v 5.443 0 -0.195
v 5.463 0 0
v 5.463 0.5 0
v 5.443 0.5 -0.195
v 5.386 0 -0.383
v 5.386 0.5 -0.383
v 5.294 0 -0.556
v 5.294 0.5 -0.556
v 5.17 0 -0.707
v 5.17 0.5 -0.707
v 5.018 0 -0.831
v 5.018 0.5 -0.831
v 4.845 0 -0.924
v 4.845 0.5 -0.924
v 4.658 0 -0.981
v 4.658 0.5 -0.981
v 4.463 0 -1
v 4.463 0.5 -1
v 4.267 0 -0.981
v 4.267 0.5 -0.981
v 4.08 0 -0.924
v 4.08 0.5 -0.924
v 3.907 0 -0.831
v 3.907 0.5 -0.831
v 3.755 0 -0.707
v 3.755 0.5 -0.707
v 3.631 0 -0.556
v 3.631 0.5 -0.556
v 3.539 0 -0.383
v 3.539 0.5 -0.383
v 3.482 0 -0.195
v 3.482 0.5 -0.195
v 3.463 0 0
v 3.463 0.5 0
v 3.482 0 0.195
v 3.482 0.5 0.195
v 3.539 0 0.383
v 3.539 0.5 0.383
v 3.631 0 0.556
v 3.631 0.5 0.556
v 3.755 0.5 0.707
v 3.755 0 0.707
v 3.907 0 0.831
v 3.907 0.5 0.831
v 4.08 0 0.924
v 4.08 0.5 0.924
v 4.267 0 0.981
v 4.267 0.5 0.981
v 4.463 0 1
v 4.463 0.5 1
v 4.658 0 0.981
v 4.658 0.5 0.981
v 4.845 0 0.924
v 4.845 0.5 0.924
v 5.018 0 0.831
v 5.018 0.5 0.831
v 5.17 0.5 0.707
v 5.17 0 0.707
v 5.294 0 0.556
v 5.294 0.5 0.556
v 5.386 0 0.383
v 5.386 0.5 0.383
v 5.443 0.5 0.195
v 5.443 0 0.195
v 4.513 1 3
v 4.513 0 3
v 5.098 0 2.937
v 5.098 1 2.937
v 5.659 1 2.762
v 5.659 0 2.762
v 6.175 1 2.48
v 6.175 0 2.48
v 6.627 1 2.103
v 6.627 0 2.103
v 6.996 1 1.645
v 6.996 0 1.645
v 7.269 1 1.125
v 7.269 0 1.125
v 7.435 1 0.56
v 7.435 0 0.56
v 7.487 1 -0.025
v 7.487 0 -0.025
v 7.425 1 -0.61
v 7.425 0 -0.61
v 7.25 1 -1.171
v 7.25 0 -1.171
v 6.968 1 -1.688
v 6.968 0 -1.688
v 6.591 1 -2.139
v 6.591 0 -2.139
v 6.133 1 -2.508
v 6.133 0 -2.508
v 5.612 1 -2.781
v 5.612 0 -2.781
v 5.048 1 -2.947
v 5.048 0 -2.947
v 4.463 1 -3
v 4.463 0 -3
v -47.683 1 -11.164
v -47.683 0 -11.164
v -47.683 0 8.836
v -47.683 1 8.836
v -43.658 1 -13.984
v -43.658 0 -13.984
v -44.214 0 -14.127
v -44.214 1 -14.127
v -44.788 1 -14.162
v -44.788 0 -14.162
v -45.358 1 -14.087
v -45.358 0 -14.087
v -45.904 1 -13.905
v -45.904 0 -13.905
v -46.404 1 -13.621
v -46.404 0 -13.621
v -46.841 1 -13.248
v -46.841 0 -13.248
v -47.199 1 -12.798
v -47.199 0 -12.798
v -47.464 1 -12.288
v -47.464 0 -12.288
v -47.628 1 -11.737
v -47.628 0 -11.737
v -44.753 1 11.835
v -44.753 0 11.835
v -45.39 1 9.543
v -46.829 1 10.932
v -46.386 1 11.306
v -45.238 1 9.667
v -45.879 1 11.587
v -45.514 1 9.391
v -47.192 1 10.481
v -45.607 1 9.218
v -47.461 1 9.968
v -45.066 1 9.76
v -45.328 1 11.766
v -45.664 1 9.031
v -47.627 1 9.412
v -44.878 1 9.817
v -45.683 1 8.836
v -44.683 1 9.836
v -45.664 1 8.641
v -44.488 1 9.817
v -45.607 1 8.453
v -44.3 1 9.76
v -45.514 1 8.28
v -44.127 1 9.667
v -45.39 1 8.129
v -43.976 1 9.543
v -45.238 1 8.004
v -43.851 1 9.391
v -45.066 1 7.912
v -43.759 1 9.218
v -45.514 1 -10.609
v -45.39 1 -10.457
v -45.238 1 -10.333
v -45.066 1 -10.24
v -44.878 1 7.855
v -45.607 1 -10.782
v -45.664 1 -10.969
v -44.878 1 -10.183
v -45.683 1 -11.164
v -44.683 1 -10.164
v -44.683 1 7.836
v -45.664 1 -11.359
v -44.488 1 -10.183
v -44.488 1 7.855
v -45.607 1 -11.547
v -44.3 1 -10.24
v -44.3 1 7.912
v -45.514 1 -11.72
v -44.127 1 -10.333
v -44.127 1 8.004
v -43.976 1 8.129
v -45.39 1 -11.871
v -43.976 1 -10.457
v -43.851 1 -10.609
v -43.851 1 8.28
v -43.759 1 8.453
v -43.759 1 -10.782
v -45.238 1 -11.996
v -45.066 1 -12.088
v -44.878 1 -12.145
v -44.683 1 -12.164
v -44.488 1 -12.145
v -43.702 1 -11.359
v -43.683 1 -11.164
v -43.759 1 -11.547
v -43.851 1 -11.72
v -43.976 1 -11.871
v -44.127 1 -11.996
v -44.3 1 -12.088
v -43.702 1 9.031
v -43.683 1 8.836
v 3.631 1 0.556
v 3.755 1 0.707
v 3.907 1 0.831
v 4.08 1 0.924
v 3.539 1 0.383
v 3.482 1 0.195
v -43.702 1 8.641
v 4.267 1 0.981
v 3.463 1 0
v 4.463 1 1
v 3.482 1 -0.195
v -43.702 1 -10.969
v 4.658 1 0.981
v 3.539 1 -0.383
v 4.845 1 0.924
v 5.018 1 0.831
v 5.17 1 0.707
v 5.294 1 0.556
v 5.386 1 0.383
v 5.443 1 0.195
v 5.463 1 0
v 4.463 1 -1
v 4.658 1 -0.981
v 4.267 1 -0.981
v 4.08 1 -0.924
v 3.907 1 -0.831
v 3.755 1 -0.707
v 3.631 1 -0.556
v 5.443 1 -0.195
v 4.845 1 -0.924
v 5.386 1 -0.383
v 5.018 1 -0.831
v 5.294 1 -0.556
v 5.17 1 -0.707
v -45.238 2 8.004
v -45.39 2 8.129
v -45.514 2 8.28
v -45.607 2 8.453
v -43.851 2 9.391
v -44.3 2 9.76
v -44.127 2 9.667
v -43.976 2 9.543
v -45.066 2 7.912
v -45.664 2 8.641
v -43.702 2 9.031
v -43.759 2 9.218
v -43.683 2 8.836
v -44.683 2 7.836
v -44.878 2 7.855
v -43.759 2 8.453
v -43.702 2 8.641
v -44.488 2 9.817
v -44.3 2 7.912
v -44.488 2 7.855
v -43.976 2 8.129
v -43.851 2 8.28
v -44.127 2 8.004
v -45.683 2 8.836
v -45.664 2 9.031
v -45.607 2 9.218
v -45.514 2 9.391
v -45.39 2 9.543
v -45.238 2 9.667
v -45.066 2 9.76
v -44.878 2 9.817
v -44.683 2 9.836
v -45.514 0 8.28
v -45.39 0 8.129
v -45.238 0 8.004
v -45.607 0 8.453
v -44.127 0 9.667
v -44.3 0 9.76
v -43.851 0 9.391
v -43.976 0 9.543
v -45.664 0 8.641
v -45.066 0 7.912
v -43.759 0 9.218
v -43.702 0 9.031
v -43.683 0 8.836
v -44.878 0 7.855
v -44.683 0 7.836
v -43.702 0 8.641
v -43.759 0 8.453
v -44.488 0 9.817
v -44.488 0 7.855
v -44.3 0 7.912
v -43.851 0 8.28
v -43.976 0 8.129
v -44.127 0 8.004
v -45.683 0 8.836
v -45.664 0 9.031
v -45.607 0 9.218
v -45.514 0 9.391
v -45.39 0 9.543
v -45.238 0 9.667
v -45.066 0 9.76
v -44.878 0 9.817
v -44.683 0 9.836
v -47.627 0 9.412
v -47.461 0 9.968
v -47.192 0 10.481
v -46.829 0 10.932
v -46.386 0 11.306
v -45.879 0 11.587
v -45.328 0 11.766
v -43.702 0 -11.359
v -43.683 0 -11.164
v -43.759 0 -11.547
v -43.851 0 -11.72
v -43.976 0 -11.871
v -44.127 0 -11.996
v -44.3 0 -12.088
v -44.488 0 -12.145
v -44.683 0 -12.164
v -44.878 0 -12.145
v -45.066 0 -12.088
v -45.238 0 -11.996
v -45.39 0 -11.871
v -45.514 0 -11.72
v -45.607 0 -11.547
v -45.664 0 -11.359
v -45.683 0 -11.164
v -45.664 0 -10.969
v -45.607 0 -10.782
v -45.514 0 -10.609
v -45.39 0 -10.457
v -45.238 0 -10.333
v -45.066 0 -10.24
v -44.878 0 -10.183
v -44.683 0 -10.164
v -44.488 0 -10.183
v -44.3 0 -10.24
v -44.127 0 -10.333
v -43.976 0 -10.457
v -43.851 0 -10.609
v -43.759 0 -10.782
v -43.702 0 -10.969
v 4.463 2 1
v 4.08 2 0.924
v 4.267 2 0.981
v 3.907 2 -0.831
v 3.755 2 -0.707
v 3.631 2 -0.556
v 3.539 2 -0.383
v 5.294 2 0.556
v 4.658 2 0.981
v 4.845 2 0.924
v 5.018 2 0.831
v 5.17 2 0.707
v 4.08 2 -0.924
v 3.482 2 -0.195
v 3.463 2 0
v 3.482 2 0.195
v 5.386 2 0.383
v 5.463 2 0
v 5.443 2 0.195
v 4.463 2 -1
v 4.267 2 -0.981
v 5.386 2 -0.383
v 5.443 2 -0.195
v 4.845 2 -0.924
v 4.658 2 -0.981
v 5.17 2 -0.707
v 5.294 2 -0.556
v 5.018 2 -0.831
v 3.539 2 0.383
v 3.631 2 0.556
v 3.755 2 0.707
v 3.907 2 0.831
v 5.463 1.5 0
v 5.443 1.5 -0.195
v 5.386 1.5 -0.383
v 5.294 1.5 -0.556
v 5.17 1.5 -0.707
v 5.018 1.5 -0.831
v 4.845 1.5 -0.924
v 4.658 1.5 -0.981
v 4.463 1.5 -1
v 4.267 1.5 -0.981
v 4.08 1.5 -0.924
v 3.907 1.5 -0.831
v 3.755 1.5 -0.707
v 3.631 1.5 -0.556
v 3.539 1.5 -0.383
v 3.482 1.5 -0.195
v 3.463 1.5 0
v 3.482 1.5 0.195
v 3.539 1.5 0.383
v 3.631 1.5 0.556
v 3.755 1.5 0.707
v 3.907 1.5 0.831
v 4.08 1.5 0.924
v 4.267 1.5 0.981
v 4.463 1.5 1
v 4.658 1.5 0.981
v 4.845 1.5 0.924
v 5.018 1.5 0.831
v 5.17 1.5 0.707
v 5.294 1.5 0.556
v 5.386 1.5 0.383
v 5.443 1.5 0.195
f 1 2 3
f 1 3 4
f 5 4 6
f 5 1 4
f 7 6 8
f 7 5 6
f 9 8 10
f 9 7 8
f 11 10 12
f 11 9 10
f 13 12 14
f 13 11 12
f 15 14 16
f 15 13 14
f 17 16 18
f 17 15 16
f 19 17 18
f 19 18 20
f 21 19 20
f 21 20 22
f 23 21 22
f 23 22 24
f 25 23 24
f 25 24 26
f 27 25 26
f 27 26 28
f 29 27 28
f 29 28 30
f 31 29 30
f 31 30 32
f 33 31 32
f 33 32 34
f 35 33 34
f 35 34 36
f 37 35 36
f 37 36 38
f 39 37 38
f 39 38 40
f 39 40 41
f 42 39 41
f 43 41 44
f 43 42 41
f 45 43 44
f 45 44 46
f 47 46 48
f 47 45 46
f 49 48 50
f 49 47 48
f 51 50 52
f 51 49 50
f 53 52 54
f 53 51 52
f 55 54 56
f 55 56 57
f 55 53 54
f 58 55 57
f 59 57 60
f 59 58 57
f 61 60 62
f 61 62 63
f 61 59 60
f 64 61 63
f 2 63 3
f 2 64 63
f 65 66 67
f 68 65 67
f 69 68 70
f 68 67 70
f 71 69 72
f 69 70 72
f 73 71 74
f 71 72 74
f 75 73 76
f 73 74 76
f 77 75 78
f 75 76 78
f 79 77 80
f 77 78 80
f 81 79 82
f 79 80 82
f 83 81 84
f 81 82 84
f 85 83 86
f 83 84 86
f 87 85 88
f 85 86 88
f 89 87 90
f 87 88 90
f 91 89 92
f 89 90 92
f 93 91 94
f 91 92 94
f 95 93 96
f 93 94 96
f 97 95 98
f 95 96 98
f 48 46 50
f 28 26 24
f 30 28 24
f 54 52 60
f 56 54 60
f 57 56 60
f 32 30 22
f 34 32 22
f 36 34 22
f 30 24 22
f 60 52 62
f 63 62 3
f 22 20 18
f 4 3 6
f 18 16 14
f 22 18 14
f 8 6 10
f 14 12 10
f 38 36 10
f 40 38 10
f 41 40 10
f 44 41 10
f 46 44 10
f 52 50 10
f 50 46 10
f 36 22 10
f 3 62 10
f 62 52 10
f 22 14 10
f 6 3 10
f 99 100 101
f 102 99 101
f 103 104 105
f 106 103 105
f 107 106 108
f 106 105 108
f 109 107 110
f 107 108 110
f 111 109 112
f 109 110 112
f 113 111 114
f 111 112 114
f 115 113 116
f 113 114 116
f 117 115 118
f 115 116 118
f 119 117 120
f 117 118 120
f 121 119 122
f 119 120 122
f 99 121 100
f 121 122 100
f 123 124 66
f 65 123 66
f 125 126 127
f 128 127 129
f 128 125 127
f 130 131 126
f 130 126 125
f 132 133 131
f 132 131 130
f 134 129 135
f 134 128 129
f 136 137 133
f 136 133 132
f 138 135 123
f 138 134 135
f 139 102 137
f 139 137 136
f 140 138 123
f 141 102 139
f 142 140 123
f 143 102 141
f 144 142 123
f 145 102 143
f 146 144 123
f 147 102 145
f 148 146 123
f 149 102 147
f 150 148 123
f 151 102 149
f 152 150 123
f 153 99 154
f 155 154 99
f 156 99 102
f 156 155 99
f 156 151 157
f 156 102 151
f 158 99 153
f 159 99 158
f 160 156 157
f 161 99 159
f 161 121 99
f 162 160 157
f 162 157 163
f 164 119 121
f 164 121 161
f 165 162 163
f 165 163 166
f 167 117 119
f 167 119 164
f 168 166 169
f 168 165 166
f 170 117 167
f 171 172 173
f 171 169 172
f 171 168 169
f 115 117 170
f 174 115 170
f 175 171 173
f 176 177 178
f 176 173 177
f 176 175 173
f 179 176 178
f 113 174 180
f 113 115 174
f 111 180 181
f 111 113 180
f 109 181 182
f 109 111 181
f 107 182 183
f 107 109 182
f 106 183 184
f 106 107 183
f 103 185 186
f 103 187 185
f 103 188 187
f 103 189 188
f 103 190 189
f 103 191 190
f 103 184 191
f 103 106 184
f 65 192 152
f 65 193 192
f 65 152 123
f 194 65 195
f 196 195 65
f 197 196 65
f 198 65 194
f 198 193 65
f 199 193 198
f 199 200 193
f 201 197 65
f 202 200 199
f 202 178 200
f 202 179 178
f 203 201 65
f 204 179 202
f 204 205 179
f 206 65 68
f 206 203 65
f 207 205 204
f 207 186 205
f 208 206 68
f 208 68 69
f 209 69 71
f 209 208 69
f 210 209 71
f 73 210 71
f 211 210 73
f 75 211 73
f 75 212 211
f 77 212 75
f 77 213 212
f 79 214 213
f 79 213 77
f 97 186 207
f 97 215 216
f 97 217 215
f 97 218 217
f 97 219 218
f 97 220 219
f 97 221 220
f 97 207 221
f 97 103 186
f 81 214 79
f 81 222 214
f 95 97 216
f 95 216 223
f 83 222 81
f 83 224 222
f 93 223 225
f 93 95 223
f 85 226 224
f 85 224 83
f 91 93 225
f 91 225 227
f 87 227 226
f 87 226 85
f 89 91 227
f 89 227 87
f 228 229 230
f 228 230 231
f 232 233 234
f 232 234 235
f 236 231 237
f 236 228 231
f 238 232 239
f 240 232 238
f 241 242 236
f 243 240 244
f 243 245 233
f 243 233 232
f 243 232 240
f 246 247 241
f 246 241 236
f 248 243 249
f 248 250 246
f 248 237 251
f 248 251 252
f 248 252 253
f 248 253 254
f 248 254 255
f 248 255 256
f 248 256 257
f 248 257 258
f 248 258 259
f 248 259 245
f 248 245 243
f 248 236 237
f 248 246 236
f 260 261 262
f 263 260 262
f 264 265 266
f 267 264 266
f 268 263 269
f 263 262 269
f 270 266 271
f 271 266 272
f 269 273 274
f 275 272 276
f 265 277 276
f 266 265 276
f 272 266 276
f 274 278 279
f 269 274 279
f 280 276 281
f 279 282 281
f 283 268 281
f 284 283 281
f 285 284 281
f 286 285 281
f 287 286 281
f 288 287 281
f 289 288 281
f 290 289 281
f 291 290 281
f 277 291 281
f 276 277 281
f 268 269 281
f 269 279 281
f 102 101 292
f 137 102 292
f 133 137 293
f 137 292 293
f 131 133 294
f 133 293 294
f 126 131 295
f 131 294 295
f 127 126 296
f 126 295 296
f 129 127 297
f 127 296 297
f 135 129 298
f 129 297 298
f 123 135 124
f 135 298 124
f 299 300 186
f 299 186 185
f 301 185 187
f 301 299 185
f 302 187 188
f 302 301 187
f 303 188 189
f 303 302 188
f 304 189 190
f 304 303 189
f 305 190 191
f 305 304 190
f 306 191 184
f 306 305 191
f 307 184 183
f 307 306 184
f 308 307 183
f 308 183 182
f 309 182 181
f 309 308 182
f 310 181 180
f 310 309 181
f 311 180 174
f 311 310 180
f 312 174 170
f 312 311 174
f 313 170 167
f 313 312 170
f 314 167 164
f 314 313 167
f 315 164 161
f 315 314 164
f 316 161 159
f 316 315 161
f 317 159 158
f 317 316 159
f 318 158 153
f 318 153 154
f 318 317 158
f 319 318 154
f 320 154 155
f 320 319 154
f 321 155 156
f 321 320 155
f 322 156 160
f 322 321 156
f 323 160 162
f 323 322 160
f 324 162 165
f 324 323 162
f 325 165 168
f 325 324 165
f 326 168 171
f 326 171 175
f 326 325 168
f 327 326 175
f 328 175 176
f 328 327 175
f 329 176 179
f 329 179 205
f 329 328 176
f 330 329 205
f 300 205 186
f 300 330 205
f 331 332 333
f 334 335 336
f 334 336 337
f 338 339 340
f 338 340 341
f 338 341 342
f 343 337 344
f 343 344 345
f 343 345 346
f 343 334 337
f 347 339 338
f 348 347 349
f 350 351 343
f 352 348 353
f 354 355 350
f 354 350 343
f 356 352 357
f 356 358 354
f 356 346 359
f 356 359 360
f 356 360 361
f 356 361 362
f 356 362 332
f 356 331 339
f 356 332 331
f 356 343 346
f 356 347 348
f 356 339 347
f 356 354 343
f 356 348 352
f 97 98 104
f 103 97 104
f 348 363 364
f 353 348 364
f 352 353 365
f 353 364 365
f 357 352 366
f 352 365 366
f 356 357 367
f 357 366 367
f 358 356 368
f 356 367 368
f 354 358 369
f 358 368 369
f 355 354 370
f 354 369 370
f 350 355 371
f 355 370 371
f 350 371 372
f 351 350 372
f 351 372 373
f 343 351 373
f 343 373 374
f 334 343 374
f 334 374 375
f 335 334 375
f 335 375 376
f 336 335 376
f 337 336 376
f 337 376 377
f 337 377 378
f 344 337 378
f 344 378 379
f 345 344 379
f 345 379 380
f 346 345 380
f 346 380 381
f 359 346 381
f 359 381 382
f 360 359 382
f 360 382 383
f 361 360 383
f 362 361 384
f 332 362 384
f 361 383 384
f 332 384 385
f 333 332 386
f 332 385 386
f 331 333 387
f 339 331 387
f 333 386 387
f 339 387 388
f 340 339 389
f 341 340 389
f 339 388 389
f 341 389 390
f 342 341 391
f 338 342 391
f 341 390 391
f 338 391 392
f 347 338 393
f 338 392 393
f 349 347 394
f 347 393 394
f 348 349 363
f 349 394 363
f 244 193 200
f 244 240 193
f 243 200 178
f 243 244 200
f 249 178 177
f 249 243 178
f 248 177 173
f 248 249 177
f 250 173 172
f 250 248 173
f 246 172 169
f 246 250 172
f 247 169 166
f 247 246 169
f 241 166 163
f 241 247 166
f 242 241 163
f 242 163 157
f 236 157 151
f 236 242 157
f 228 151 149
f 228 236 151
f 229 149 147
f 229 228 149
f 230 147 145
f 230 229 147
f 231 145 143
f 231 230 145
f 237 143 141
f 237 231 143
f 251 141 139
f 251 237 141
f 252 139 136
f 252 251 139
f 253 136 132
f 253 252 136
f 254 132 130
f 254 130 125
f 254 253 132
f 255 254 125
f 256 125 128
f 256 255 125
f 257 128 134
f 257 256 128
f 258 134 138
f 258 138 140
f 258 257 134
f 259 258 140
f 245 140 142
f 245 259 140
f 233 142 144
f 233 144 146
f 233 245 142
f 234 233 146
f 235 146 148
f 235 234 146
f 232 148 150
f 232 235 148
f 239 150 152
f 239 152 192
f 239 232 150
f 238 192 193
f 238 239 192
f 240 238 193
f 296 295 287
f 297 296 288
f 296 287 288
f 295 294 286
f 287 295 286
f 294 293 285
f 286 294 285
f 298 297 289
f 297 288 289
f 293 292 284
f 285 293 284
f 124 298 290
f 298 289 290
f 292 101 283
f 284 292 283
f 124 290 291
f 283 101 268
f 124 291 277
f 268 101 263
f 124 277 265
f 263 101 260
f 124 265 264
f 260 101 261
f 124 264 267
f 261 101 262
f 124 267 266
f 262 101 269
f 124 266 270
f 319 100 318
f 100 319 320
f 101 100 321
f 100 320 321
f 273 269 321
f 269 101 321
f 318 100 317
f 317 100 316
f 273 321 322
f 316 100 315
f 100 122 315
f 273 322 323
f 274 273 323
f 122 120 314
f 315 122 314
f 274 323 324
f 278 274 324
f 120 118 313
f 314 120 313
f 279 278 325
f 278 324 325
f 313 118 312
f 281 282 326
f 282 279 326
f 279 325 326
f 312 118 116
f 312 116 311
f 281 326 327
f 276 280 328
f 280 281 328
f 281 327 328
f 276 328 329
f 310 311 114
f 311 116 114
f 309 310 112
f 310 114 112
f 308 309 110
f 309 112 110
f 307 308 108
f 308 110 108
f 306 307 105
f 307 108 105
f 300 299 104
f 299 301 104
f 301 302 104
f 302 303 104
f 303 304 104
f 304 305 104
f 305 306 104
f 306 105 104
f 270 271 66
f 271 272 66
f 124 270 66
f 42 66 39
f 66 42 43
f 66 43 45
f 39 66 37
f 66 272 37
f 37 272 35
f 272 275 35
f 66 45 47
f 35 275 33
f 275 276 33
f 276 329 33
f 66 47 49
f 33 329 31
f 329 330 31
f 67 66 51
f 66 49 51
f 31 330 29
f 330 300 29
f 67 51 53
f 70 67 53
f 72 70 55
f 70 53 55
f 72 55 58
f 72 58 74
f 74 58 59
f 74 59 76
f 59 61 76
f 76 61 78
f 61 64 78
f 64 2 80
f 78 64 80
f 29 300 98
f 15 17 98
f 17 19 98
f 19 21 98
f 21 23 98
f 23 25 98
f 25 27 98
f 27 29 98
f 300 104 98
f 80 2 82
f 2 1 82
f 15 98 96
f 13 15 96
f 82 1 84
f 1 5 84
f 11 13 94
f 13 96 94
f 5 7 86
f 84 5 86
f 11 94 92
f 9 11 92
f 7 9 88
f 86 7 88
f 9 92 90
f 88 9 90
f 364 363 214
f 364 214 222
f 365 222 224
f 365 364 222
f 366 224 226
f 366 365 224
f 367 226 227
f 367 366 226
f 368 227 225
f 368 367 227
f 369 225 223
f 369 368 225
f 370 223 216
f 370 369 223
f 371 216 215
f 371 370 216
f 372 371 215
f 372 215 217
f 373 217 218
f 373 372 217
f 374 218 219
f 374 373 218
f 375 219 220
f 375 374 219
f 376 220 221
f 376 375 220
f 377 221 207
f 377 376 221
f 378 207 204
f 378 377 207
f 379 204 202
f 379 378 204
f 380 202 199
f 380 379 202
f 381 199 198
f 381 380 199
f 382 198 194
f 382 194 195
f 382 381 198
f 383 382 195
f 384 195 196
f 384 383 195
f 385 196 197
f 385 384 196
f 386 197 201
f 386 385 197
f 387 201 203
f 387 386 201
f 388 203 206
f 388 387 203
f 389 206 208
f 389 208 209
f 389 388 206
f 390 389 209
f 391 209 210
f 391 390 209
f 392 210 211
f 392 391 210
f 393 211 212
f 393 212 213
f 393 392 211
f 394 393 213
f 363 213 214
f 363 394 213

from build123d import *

# Parameters (mm, degrees)
SKETCH1_R           = 1
BOSS_EXTRUDE5_DEPTH = 1
SKETCH3_R           = 1
BOSS_EXTRUDE6_DEPTH = 0.5
SKETCH5_R           = 1
BOSS_EXTRUDE8_DEPTH = 1
SKETCH6_R           = 1
BOSS_EXTRUDE9_DEPTH = 1


with BuildPart() as part:
    # Sketch1 → Boss-Extrude5 (new body)
    with BuildSketch(Plane(origin=(0, 0, 0), x_dir=(1, 0, 0), z_dir=(0, 1, 0))):
        with BuildLine():
            Line((-47.682880055, 11.164224632), (-47.682880055, -8.835775368))
            ThreePointArc((-47.682880055, -8.835775368), (-46.828715239, -10.932294236), (-44.752619147, -11.834964669))
            Line((-44.752619147, -11.834964669), (4.512839673, -2.999578636))
            ThreePointArc((4.512839673, -2.999578636), (7.487489348, 0.025350325), (4.462560387, 3))
            Line((4.462560387, 3), (-43.657583095, 13.983580257))
            ThreePointArc((-43.657583095, 13.983580257), (-46.403942099, 13.621447747), (-47.682880055, 11.164224632))
        make_face()
        with Locations((-44.682880055, 11.164224632)):
            Circle(SKETCH1_R, mode=Mode.SUBTRACT)
        with Locations((-44.682880055, -8.835775368)):
            Circle(SKETCH1_R, mode=Mode.SUBTRACT)
        with Locations((4.462560387, 0)):
            Circle(SKETCH1_R, mode=Mode.SUBTRACT)
    extrude(amount=BOSS_EXTRUDE5_DEPTH)

    # Sketch3 → Boss-Extrude6 (add, symmetric)
    with BuildSketch(Plane(origin=(0, 1, 0), x_dir=(1, 0, 0), z_dir=(0, 1, 0))):
        with Locations((4.462560387, 0)):
            Circle(SKETCH3_R)
    extrude(amount=BOSS_EXTRUDE6_DEPTH, both=True)

    # Sketch5 → Boss-Extrude8 (add)
    with BuildSketch(Plane(origin=(0, 1, 0), x_dir=(1, 0, 0), z_dir=(0, 1, 0))):
        with Locations((4.462560387, 0)):
            Circle(SKETCH5_R)
    extrude(amount=BOSS_EXTRUDE8_DEPTH)

    # Sketch6 → Boss-Extrude9 (add, symmetric)
    with BuildSketch(Plane(origin=(0, 1, 0), x_dir=(1, 0, 0), z_dir=(0, 1, 0))):
        with Locations((-44.682880055, -8.835775368)):
            Circle(SKETCH6_R)
    extrude(amount=BOSS_EXTRUDE9_DEPTH, both=True)


solid = part.part
